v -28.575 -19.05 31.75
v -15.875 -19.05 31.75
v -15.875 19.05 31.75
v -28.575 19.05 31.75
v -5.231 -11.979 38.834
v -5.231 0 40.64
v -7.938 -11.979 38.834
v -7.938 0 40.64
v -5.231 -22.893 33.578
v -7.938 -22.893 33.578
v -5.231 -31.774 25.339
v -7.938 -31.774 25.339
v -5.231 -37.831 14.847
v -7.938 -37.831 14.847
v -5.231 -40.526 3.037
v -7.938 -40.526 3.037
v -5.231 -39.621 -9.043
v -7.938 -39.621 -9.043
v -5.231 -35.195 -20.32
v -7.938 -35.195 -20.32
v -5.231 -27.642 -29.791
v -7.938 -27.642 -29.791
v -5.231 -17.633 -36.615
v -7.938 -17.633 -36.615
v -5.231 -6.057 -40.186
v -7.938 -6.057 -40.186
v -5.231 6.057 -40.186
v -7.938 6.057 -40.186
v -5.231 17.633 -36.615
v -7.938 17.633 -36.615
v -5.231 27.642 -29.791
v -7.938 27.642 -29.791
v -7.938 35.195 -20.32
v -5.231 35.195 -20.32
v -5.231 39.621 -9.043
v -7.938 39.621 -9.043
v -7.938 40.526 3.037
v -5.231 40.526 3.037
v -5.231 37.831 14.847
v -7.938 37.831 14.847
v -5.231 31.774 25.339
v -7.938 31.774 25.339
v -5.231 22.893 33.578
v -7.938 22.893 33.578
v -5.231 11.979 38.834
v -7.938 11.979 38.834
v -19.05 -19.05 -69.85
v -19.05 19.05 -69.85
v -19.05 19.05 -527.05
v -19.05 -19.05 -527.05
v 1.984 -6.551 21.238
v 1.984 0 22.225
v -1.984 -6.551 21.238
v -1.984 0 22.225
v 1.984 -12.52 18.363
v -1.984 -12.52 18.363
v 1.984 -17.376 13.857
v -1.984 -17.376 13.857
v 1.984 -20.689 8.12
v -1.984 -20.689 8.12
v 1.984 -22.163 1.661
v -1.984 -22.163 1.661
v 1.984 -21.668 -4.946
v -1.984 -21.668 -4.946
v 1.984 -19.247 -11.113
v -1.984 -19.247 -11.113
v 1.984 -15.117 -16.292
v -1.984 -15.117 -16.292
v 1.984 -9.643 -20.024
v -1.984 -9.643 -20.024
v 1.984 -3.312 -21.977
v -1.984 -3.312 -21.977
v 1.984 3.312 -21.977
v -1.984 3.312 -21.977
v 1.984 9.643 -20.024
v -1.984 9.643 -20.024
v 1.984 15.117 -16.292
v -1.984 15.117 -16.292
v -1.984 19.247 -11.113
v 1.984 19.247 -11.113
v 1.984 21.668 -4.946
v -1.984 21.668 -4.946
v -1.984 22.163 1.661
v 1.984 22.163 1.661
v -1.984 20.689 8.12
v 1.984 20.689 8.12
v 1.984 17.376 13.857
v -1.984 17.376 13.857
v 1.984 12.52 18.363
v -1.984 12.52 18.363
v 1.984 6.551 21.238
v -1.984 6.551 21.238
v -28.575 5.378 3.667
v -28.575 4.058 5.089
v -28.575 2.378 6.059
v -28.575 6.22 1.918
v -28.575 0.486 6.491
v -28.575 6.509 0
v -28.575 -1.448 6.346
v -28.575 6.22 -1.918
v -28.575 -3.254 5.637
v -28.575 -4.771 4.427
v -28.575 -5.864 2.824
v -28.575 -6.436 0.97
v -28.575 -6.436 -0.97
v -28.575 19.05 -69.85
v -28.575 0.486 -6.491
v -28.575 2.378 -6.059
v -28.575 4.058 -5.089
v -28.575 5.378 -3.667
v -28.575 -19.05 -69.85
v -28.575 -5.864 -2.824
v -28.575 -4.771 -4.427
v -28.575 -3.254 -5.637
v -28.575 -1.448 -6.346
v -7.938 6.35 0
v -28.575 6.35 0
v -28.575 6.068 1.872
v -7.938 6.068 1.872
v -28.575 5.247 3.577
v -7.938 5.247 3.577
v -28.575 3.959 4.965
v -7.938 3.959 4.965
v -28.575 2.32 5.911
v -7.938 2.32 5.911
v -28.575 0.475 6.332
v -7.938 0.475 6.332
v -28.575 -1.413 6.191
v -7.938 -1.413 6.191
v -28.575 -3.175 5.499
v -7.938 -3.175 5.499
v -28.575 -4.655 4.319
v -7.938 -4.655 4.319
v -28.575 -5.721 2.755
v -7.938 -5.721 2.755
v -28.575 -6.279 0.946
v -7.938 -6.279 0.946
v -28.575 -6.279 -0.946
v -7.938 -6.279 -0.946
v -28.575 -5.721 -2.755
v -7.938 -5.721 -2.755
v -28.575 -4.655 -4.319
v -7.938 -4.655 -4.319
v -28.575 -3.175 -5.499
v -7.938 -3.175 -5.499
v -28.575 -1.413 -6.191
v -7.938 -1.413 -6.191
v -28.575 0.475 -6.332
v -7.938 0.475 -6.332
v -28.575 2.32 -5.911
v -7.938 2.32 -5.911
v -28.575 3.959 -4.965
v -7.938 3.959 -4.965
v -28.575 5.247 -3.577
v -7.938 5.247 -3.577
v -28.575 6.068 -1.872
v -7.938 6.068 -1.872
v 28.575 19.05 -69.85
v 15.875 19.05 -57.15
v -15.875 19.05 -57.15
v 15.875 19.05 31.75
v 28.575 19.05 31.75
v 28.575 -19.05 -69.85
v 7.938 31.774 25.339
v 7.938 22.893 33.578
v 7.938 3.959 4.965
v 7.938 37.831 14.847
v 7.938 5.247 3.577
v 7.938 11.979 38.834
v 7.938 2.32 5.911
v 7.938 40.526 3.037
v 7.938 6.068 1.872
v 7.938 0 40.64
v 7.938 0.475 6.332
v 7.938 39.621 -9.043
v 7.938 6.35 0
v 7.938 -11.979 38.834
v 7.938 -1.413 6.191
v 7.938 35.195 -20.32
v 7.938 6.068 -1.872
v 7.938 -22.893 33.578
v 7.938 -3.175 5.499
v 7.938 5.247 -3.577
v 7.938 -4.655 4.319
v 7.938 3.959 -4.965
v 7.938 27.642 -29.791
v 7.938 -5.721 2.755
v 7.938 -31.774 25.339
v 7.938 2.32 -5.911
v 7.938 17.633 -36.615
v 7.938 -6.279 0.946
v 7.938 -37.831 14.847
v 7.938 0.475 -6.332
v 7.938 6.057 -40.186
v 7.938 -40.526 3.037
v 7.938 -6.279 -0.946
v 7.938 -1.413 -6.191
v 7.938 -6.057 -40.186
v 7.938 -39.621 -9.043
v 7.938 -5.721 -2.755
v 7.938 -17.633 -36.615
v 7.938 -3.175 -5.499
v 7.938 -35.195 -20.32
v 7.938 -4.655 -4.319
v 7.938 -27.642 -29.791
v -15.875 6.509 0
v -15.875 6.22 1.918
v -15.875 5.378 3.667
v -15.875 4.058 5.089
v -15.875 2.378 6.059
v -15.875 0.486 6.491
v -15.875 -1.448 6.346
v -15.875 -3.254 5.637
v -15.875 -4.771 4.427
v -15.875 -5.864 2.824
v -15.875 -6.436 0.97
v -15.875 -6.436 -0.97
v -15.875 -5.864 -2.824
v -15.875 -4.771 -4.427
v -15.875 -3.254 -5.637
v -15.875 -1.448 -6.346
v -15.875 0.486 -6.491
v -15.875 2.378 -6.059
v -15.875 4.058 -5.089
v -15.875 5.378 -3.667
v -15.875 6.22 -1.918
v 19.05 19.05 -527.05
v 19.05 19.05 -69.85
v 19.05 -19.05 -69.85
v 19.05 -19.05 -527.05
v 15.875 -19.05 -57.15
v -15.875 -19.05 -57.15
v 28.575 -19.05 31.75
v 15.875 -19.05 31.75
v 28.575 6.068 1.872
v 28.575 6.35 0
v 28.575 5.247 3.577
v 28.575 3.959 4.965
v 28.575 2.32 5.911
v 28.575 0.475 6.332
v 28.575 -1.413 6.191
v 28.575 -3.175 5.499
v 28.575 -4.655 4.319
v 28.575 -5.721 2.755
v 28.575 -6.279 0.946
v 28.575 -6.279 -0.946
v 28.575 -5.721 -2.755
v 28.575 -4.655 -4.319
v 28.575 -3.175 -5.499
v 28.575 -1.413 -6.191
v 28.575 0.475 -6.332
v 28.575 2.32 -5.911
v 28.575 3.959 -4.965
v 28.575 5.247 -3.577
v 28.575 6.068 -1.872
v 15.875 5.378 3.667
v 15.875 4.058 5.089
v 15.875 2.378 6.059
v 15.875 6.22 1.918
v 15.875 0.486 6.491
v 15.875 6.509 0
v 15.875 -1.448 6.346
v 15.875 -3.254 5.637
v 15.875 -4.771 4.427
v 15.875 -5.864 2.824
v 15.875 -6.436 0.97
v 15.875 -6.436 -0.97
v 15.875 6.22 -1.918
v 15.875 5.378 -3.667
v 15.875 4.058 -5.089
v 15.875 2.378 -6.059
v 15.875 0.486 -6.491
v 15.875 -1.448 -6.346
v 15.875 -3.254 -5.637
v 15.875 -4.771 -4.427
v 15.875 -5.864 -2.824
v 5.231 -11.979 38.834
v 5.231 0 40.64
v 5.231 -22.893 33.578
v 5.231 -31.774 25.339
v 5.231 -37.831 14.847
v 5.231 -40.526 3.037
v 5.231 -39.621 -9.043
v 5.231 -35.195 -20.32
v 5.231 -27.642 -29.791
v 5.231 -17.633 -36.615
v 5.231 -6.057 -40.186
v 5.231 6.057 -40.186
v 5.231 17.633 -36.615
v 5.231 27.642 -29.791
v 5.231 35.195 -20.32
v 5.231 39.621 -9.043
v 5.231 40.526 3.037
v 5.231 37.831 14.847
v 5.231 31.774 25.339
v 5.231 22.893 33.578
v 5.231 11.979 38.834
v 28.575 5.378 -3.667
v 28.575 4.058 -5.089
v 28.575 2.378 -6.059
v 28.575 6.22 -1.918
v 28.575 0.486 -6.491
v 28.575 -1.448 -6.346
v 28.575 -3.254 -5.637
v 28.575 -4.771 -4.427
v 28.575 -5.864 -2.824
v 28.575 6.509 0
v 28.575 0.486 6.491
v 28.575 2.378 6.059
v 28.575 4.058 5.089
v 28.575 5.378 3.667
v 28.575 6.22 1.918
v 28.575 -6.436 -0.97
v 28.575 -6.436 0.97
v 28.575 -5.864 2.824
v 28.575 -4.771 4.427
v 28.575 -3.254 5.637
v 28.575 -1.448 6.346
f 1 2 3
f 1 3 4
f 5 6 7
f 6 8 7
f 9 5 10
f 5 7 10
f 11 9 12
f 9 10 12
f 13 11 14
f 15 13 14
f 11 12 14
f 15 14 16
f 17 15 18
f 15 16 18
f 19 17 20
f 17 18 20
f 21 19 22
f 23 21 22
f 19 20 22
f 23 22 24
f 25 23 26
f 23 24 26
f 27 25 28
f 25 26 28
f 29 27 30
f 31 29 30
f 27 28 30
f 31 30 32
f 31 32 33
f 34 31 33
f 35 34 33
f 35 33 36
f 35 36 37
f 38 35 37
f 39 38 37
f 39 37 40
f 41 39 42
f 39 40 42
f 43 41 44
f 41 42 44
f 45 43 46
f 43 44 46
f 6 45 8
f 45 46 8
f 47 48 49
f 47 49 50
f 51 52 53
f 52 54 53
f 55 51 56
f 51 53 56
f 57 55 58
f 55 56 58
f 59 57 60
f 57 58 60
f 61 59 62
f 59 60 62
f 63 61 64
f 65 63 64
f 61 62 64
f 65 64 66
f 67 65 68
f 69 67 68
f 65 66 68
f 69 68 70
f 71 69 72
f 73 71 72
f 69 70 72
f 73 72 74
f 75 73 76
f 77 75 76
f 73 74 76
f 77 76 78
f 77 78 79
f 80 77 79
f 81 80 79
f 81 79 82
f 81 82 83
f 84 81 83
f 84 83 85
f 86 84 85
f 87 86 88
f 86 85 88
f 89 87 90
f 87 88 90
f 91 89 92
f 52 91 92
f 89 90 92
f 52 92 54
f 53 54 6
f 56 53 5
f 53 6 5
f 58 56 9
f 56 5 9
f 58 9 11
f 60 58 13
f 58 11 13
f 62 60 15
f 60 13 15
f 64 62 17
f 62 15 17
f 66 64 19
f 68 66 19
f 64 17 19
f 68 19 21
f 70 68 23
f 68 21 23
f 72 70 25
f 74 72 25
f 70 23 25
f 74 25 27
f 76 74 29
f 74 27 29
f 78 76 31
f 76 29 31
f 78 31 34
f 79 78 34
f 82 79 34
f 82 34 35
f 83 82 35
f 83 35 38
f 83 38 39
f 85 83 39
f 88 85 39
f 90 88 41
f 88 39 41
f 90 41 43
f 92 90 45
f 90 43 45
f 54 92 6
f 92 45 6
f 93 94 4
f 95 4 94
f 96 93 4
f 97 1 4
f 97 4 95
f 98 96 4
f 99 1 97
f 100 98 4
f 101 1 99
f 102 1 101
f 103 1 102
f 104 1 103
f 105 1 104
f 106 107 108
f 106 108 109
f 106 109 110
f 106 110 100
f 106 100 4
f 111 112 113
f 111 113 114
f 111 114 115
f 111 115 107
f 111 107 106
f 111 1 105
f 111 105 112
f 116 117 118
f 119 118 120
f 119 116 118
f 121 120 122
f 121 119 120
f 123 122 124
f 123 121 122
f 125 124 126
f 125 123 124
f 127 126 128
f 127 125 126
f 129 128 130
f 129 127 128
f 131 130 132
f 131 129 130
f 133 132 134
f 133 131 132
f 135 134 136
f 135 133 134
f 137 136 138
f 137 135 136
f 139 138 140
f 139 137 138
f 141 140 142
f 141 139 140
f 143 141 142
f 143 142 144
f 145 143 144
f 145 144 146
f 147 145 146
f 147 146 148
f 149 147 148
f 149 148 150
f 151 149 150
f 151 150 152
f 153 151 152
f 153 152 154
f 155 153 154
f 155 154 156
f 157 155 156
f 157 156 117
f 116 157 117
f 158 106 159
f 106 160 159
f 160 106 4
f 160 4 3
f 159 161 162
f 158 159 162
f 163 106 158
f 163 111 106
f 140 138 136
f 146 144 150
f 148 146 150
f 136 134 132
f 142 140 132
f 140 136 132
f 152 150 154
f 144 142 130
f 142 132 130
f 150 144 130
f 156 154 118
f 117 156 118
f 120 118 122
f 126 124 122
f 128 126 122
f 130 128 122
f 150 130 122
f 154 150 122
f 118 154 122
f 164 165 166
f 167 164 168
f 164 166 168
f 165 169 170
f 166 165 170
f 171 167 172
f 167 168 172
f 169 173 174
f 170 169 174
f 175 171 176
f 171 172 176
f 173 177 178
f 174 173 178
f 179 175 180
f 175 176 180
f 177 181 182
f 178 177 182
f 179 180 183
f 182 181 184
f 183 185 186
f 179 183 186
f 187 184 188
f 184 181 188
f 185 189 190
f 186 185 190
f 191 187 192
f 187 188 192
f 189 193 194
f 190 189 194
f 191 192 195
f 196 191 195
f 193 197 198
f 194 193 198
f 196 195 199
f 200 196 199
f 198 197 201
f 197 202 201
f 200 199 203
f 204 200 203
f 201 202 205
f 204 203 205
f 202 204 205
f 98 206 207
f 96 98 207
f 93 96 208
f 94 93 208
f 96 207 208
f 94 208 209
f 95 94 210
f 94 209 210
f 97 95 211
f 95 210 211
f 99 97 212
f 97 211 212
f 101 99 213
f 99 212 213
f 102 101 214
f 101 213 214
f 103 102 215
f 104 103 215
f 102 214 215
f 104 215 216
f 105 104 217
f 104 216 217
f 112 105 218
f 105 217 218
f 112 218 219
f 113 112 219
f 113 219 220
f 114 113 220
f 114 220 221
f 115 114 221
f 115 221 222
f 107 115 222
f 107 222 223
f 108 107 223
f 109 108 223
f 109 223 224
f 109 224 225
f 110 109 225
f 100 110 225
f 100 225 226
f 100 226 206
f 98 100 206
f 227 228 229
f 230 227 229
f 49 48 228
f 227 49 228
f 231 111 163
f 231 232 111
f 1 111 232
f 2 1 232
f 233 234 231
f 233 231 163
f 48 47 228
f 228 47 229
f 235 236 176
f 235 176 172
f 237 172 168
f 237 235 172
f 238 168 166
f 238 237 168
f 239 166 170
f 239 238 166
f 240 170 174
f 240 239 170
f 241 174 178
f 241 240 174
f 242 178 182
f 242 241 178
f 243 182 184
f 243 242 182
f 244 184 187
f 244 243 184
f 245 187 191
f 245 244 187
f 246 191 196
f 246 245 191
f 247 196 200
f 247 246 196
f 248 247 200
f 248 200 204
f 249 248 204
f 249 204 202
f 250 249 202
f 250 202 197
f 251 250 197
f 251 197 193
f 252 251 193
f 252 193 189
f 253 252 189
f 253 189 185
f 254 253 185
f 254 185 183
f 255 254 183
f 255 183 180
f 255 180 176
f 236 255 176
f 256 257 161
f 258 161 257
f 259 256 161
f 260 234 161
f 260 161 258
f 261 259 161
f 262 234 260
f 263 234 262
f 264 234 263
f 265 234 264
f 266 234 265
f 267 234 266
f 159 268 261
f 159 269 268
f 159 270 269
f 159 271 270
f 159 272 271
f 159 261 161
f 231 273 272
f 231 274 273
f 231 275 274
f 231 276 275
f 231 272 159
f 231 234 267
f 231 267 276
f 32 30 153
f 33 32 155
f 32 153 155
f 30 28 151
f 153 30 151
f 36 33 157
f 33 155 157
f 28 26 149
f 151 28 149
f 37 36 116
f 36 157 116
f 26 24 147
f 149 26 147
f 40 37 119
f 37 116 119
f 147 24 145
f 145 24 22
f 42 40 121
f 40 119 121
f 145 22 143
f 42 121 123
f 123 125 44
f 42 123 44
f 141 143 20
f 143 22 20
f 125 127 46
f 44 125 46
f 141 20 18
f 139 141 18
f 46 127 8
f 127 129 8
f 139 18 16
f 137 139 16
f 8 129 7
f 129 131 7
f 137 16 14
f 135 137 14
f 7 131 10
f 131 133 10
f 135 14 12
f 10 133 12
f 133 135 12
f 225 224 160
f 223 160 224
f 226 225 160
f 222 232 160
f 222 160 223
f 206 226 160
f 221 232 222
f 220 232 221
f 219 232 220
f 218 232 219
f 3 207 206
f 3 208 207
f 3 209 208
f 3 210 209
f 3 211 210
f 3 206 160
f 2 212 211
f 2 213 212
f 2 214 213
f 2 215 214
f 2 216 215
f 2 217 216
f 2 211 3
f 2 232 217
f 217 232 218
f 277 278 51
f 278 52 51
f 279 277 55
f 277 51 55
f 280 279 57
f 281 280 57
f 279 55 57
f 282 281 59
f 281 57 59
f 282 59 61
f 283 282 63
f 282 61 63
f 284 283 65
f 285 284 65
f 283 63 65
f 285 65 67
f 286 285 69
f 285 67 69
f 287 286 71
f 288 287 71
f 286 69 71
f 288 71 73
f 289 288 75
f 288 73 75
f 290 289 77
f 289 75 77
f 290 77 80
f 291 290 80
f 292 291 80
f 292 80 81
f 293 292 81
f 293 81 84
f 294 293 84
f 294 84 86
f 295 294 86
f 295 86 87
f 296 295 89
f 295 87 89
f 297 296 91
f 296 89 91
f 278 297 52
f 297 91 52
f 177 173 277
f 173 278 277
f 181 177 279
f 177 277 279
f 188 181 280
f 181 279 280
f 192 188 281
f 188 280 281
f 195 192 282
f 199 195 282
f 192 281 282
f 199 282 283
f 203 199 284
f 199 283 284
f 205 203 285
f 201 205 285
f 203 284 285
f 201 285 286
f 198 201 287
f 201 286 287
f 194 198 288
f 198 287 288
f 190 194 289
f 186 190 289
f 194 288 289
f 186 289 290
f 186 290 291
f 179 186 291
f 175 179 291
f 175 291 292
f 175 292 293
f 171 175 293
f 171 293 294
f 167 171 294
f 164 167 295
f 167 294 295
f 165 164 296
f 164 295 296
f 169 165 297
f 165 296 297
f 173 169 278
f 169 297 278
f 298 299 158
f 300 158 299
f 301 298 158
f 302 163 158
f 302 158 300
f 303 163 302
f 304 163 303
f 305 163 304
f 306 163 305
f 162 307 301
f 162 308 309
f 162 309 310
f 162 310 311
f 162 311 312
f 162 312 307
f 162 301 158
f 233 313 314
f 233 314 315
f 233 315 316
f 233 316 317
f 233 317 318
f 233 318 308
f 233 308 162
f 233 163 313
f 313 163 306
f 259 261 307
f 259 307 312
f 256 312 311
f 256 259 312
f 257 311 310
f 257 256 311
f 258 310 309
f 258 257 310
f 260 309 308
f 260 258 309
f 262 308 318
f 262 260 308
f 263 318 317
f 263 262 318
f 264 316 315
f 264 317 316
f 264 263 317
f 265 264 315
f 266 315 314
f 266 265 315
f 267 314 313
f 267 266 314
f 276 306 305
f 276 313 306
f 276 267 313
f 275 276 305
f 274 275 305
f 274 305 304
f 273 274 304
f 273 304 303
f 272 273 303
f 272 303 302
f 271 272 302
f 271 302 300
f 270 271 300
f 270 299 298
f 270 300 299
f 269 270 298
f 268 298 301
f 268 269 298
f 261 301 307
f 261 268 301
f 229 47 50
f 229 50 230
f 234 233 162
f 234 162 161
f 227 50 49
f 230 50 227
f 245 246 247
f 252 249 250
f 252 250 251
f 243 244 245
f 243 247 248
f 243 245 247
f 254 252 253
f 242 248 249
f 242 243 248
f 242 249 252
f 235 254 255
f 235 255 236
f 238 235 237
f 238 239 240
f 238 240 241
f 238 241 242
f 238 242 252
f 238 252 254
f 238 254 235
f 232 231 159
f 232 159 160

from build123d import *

# Parameters (mm, degrees)
F3_DEPTH      = 19.05
F4_R          = 6.50875
F5_DEPTH      = 28.576
F5_DEPTH_BACK = 28.576
F6_W          = 38.1
F6_H          = 38.1
F7_DEPTH      = 457.2
F8_R          = 6.35
F9_DEPTH      = 57.15


with BuildPart() as f1:
    # F0 (on Front) → F1 (revolve)
    with BuildSketch(Plane.XZ):
        Polygon((0, 6.35), (0, 22.225), (-1.984375, 22.225), (-5.2314363497, 40.64), (-7.9375, 40.64), (-7.9375, 6.35), align=None)
        Polygon((1.984375, 22.225), (0, 22.225), (0, 6.35), (7.9375, 6.35), (7.9375, 40.64), (5.2314363497, 40.64), align=None)
    revolve(axis=Axis((0, 0, 0), (1, 0, 0)))

    # F8 (on face) → F9 (join)
    with BuildSketch(Plane.YZ.offset(28.575)):
        Circle(F8_R)
    extrude(amount=-F9_DEPTH)


with BuildPart() as f3:
    # F2 (on Front) → F3 (new body, symmetric)
    with BuildSketch(Plane.XZ):
        Polygon((28.575, -69.85), (28.575, 31.75), (15.875, 31.75), (15.875, -57.15), (-15.875, -57.15), (-15.875, 31.75), (-28.575, 31.75), (-28.575, -69.85), align=None)
    extrude(amount=F3_DEPTH, both=True)

    # F4 (on Right) → F5 (cut, two sides)
    with BuildSketch(Plane.YZ) as f5_sk:
        Circle(F4_R)
    extrude(amount=-F5_DEPTH, mode=Mode.SUBTRACT)
    extrude(f5_sk.sketch, amount=F5_DEPTH_BACK, mode=Mode.SUBTRACT)


with BuildPart() as f7:
    # F6 (on face) → F7 (new body)
    with BuildSketch(Plane(origin=(0, 0, -69.85), x_dir=(1, 0, 0), z_dir=(0, 0, -1))):
        Rectangle(F6_W, F6_H)
    extrude(amount=F7_DEPTH)


solid = Compound([f1.part, f3.part, f7.part])
